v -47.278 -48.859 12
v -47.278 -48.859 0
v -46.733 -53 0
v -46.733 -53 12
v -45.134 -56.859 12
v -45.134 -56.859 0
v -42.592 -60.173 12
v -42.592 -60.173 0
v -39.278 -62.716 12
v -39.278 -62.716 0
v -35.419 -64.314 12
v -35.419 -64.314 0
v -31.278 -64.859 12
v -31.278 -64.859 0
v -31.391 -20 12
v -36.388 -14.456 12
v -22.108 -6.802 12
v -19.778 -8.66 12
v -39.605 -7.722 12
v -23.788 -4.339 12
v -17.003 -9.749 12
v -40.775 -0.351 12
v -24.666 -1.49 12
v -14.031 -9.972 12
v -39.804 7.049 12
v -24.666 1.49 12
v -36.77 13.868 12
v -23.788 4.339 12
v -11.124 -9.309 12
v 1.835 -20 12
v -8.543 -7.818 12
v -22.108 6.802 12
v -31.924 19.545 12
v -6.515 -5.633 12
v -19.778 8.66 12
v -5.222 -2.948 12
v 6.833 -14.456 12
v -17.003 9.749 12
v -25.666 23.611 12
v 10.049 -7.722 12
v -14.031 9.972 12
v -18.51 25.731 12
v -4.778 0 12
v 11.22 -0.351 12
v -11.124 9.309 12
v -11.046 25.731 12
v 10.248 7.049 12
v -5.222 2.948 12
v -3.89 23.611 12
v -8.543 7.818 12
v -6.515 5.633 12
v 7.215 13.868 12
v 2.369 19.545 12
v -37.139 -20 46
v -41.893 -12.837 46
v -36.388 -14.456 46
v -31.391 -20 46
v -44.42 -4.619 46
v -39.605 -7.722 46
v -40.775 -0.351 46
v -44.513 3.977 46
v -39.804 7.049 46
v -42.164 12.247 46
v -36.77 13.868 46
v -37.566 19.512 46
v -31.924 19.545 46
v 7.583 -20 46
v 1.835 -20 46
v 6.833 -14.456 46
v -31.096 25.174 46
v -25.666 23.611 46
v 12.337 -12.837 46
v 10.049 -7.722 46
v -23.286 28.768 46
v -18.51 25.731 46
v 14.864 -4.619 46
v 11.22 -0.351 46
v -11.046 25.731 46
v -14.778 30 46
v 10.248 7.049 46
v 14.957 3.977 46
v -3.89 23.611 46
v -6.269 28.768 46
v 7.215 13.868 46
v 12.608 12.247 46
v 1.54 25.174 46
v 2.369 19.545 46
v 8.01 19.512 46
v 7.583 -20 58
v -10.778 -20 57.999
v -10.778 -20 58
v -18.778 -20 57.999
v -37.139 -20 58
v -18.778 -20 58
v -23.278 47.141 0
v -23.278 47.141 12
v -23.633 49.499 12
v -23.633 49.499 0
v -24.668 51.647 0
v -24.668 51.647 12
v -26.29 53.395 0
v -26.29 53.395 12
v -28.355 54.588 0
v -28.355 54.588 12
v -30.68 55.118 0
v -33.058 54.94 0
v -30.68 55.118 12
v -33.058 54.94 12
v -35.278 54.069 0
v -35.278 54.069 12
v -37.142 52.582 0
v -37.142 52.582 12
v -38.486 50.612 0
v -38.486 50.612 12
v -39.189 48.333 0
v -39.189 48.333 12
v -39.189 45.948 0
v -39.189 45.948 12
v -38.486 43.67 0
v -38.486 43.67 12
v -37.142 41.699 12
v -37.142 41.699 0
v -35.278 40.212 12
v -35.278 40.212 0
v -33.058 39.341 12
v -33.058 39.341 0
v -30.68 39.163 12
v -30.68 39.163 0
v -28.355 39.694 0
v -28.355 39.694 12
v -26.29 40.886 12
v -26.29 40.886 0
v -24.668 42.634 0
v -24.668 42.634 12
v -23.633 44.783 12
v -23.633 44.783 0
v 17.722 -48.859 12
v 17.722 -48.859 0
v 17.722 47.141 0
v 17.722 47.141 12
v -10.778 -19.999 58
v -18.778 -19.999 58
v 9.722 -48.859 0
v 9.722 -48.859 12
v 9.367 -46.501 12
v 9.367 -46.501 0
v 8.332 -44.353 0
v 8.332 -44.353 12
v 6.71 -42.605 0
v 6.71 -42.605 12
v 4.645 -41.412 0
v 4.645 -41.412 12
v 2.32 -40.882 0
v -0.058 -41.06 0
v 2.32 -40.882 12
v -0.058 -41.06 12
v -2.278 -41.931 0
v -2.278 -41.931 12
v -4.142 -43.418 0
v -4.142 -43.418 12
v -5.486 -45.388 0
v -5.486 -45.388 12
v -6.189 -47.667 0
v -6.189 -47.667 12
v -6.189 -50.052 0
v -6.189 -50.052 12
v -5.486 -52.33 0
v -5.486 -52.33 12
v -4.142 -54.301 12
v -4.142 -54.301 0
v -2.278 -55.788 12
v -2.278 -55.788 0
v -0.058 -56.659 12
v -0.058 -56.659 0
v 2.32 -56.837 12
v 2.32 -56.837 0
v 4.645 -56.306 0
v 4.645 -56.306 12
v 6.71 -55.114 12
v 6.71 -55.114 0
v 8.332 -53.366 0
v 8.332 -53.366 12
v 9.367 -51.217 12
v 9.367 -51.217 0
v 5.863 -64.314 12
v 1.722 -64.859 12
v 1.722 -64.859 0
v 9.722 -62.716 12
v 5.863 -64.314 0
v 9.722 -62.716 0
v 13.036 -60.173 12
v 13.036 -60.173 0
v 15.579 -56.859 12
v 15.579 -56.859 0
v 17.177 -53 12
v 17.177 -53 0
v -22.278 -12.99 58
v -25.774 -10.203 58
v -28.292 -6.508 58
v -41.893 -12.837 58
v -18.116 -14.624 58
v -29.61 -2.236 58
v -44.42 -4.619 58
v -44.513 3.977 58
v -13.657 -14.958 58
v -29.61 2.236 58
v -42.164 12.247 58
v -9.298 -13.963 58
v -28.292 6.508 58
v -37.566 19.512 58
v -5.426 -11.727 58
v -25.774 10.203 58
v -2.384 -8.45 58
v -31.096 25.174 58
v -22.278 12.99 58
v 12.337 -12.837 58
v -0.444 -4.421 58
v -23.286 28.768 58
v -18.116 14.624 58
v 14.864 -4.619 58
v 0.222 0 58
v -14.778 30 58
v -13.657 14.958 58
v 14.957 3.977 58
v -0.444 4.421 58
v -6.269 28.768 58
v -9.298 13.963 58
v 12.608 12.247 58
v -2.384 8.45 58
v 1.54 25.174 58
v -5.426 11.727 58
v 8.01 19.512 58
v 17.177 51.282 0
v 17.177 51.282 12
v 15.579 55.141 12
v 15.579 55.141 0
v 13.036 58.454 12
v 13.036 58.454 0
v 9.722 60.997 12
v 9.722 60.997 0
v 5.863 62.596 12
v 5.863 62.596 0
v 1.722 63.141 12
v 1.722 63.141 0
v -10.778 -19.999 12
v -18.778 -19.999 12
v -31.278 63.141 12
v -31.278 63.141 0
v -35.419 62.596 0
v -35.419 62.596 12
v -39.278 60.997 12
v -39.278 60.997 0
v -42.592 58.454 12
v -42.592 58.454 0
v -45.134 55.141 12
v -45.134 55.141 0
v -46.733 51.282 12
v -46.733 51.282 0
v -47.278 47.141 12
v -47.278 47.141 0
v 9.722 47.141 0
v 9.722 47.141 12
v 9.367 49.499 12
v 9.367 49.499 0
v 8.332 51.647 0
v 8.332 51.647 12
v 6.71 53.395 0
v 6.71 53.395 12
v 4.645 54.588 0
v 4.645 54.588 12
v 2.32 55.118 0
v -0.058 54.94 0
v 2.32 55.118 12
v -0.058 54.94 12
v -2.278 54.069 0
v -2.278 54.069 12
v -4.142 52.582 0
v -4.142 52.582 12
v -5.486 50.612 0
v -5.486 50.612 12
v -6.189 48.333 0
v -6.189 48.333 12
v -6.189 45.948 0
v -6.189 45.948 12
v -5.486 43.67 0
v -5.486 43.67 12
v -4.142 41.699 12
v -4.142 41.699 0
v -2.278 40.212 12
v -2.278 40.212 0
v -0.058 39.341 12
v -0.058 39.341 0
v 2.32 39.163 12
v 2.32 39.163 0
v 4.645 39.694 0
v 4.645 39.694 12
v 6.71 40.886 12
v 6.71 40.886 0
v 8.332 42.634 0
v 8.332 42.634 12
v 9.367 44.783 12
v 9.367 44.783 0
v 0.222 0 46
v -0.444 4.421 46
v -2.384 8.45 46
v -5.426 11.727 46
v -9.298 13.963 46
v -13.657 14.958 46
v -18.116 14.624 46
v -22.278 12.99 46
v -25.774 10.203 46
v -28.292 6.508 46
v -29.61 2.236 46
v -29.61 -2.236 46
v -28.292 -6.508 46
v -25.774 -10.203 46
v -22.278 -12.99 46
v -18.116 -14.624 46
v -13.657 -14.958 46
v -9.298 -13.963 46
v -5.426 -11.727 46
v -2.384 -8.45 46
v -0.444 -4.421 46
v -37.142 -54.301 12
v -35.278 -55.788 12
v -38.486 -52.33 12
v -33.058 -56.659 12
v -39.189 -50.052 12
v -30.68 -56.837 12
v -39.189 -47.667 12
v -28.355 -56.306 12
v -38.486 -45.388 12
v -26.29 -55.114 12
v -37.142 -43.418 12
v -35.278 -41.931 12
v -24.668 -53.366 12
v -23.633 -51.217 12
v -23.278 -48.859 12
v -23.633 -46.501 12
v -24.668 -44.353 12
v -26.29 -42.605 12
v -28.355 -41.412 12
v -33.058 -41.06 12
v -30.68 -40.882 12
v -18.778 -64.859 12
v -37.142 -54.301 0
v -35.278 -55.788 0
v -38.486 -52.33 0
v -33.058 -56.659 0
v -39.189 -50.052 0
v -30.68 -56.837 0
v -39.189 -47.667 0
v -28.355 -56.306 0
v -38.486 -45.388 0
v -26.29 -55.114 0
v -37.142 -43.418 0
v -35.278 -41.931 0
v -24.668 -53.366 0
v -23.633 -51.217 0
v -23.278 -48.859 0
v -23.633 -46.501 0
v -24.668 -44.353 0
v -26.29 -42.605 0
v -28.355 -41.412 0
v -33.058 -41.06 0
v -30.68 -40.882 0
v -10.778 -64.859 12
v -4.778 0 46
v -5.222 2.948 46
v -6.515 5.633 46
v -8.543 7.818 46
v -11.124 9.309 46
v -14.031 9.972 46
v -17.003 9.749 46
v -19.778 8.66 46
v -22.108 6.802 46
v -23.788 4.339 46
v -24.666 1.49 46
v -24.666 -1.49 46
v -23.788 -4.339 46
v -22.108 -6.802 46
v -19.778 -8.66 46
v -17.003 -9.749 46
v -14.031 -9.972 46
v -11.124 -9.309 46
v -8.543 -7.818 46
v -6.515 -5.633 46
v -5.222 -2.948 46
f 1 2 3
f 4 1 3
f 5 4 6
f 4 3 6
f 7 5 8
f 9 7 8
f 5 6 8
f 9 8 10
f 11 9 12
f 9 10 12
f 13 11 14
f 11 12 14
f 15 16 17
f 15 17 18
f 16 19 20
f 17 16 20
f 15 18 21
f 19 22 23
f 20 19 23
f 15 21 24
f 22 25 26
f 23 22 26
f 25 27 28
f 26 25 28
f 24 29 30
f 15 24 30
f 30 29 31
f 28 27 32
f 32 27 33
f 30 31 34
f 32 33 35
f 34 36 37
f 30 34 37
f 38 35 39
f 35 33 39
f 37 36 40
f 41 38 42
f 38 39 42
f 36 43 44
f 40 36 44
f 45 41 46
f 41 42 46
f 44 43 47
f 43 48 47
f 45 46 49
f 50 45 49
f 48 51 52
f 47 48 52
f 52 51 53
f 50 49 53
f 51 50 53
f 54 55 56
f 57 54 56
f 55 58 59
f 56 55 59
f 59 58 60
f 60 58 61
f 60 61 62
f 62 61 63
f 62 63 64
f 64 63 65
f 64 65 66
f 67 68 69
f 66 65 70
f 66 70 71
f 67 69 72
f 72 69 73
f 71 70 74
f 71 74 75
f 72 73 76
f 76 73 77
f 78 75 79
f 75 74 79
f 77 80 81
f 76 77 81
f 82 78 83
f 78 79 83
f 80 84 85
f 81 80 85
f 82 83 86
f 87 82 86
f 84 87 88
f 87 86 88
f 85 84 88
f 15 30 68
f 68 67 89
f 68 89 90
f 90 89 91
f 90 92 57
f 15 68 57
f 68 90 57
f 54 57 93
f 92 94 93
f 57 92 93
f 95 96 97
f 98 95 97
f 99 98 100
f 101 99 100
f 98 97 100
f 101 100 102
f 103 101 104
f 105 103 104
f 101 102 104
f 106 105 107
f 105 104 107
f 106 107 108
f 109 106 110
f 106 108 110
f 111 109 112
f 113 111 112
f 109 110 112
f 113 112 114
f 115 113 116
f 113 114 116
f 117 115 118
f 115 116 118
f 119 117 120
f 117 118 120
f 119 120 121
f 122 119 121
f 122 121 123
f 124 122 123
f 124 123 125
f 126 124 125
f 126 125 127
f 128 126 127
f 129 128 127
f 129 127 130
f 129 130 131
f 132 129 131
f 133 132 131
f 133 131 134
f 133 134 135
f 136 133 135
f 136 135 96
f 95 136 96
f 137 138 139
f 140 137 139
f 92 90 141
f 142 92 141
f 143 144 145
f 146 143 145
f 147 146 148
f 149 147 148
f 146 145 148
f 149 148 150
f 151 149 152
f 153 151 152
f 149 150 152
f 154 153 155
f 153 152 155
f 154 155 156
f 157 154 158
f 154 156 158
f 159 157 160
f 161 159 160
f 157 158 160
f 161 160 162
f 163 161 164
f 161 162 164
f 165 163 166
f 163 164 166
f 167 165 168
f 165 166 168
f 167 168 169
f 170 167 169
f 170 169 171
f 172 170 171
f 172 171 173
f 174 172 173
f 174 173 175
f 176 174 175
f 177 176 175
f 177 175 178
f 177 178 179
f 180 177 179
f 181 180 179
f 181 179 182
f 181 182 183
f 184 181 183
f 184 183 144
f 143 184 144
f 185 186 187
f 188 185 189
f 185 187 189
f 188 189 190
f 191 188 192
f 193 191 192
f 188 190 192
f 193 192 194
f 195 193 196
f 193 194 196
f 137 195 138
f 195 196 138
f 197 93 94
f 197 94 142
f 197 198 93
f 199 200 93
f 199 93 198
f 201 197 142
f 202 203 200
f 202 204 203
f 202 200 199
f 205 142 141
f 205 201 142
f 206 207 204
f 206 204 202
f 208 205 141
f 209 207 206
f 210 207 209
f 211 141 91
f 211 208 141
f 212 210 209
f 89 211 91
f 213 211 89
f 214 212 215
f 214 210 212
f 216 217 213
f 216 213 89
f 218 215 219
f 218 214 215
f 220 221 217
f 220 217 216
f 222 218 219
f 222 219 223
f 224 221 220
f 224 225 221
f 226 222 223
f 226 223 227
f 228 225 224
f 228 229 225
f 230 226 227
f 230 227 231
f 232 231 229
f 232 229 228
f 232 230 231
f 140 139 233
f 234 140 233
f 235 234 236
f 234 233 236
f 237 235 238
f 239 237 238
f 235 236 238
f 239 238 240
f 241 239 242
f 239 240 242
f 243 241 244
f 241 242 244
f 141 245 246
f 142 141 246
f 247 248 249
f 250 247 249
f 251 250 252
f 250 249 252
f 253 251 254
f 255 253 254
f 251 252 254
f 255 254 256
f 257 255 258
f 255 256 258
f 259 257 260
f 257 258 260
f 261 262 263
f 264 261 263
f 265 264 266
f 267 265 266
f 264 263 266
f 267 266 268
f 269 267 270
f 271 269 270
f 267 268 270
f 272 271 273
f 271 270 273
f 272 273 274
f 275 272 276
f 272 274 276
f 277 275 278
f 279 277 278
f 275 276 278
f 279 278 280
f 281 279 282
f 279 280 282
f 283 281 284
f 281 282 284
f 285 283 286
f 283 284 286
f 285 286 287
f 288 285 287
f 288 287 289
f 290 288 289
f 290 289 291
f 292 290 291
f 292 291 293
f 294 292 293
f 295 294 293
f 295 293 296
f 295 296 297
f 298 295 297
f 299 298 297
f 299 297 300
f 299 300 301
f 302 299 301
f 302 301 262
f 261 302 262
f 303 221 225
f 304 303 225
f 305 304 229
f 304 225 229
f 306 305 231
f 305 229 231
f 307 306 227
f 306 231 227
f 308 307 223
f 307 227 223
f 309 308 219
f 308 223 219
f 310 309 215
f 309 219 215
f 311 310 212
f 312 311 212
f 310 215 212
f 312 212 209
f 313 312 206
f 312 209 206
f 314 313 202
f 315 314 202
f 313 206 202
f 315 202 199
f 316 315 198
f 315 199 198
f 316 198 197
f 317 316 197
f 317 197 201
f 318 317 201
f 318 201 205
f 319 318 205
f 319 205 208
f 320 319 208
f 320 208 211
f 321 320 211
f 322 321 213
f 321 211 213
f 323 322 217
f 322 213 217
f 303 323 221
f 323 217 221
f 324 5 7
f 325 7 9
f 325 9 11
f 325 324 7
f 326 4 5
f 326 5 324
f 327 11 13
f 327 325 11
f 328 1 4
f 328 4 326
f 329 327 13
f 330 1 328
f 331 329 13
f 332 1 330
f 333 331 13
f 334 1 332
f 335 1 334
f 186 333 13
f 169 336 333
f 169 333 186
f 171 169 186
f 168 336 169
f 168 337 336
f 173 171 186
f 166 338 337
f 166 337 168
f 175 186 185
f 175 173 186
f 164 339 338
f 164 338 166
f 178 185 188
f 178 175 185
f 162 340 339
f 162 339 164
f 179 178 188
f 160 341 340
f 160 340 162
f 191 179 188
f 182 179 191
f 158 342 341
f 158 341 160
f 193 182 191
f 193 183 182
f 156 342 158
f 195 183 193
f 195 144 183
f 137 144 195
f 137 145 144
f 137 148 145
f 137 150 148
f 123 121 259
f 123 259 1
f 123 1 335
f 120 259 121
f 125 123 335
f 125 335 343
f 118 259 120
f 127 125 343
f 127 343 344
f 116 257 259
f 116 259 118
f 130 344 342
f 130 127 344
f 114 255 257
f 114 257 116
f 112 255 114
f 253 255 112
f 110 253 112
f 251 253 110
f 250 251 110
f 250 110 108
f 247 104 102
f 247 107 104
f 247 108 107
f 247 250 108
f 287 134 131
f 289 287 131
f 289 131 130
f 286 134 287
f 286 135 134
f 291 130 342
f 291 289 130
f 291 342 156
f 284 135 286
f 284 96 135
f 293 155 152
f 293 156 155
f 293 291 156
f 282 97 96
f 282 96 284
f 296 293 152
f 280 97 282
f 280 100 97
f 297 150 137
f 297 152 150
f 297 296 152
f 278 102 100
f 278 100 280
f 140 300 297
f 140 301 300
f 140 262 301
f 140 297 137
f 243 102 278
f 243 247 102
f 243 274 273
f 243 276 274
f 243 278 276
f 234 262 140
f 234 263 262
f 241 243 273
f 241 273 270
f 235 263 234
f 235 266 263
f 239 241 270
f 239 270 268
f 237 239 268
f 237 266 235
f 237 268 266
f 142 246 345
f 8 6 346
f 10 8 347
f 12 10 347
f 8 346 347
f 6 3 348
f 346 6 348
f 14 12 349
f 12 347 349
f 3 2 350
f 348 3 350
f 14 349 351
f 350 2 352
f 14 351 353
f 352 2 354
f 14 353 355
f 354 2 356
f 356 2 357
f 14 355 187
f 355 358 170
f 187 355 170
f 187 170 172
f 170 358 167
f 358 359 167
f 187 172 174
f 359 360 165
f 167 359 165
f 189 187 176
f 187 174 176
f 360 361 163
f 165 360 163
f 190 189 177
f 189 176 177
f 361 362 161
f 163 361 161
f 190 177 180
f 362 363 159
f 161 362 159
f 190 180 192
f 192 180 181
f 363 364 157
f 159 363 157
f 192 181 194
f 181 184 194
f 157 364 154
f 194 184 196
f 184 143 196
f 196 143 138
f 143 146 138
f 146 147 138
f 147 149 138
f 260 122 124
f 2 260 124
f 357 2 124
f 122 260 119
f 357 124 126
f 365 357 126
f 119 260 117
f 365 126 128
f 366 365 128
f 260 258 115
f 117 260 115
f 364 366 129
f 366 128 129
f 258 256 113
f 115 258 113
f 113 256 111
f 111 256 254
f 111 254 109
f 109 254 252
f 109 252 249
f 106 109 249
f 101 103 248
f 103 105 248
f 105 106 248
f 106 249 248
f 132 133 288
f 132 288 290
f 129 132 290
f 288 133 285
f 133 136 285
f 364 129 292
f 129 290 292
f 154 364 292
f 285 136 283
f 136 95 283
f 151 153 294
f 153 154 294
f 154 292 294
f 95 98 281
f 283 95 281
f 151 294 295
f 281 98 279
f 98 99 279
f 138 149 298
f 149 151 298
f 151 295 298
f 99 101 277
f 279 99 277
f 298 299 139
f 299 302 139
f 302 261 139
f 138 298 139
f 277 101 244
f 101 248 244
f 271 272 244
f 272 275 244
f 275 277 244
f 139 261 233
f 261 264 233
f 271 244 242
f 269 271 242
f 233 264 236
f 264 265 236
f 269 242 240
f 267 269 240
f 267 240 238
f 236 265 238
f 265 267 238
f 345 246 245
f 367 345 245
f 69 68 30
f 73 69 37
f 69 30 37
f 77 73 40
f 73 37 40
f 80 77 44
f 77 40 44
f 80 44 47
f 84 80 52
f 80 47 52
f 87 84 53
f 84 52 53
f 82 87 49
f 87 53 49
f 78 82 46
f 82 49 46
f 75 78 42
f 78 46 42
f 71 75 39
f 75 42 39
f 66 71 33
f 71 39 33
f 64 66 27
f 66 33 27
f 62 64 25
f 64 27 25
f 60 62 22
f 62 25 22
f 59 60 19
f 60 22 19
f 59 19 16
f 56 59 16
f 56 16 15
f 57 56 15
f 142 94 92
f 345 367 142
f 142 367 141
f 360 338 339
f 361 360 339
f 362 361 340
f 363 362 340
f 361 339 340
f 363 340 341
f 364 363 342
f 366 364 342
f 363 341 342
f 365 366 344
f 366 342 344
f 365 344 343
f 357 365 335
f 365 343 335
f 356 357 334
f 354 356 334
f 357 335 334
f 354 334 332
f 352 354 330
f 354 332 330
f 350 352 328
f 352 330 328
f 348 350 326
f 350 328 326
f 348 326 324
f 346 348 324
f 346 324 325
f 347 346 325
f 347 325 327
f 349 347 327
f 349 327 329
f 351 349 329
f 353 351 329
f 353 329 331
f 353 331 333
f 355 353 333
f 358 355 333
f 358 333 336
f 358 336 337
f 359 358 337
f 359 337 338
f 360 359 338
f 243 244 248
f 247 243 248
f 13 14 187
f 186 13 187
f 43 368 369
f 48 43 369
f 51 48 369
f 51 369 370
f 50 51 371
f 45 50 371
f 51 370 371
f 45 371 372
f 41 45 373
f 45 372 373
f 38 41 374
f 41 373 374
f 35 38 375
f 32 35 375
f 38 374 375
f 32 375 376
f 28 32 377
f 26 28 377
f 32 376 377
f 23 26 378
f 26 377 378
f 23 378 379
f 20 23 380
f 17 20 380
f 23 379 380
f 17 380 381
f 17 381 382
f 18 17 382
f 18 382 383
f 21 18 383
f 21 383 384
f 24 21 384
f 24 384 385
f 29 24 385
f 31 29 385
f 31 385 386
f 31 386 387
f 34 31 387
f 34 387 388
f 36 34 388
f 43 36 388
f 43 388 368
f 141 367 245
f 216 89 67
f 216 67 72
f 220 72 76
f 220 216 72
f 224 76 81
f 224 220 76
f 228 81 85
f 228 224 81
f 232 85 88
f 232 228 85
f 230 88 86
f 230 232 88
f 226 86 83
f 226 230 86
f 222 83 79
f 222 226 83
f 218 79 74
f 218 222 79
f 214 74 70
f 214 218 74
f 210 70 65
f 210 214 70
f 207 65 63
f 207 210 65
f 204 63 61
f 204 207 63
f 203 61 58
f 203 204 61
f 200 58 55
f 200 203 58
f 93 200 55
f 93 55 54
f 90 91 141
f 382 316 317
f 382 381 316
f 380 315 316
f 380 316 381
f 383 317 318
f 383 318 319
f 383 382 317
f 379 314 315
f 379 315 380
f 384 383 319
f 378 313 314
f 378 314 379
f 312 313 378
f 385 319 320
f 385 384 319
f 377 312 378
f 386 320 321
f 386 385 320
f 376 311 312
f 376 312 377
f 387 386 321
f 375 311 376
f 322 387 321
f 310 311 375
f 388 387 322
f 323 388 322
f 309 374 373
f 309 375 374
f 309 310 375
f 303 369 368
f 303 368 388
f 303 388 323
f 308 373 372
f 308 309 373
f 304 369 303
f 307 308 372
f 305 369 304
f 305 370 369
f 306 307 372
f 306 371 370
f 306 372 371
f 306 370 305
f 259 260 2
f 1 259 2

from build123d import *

# Parameters (mm, degrees)
F1_DEPTH  = 12
F2_R      = 8
F3_DEPTH  = 25
F4_R      = 26
F5_DEPTH  = 46
F6_R      = 10
F7_DEPTH  = 58
F8_R      = 30
F9_DEPTH  = 12
F10_R     = 15
F11_DEPTH = 12
F13_DEPTH = 46
F15_DEPTH = 46
F17_DEPTH = 8


with BuildPart() as f1:
    # F0 (on Top) → F1 (new body)
    with BuildSketch(Plane.XY):
        with BuildLine():
            ThreePointArc((-31.2778624006, 63.140702188), (-42.5915708996, 58.454410687), (-47.2778624006, 47.140702188))
            Line((-47.2778624006, 47.140702188), (-47.2778624006, -48.859297812))
            ThreePointArc((-47.2778624006, -48.859297812), (-42.5915708996, -60.173006311), (-31.2778624006, -64.859297812))
            Line((-31.2778624006, -64.859297812), (1.7221375994, -64.859297812))
            ThreePointArc((1.7221375994, -64.859297812), (13.0358460984, -60.173006311), (17.7221375994, -48.859297812))
            Line((17.7221375994, -48.859297812), (17.7221375994, 47.140702188))
            ThreePointArc((17.7221375994, 47.140702188), (13.0358460984, 58.454410687), (1.7221375994, 63.140702188))
            Line((1.7221375994, 63.140702188), (-31.2778624006, 63.140702188))
        make_face()
    extrude(amount=F1_DEPTH)

    # F2 (on face) → F3 (cut)
    with BuildSketch(Plane.XY.offset(12)):
        with Locations((-31.2778624006, 47.140702188)):
            Circle(F2_R)
        with Locations((1.7221375994, 47.140702188)):
            Circle(F2_R)
        with Locations((1.7221375994, -48.859297812)):
            Circle(F2_R)
        with Locations((-31.2778624006, -48.859297812)):
            Circle(F2_R)
    extrude(amount=-F3_DEPTH, mode=Mode.SUBTRACT)


with BuildPart() as f5:
    # F4 (on face) → F5 (new body)
    with BuildSketch(Plane.XY.offset(12)):
        with Locations((-14.7778624006, 0)):
            Circle(F4_R)
    extrude(amount=F5_DEPTH)

    # F6 (on face) → F7 (cut)
    with BuildSketch(Plane.XY.offset(58)):
        with Locations((-14.7778624006, 0)):
            Circle(F6_R)
    extrude(amount=-F7_DEPTH, mode=Mode.SUBTRACT)

    # F8 (on face) → F9 (join)
    with BuildSketch(Plane.XY.offset(58)):
        with Locations((-14.7778624006, 0)):
            Circle(F8_R)
    extrude(amount=-F9_DEPTH)

    # F10 (on face) → F11 (cut)
    with BuildSketch(Plane.XY.offset(58)):
        with Locations((-14.7778624006, 0)):
            Circle(F10_R)
    extrude(amount=-F11_DEPTH, mode=Mode.SUBTRACT)

    # F12 (on face) → F13 (cut, through all)
    with BuildSketch(Plane.XY.offset(58)):
        with BuildLine():
            Line((7.5828173744, -20), (-37.1385421756, -20))
            ThreePointArc((-37.1385421756, -20), (-14.7778624006, -30), (7.5828173744, -20))
        make_face()
    extrude(amount=-F13_DEPTH, mode=Mode.SUBTRACT)


with BuildPart() as f15:
    # F14 (on face) → F15 (new body)
    with BuildSketch(Plane.XY.offset(12)):
        Polygon((-18.7778624006, -19.9992656708), (-18.7778624006, -64.859297812), (-10.7778624006, -64.859297812), (-10.7778624006, -19.9992656708), (-14.7778624006, -19.9992656708), align=None)
    extrude(amount=F15_DEPTH)


with BuildPart() as f17_tool:
    # F16 (on face) → F17 (new body)
    with BuildSketch(Plane.YZ.offset(-10.7778624006)):
        Polygon((-64.859297812, 12), (-19.9992656708, 58), (-64.859297812, 58), align=None)
    extrude(amount=-F17_DEPTH)


with BuildPart() as f5_1:
    add(f5.part)

    # F17: cut by f17_tool
    add(f17_tool.part, mode=Mode.SUBTRACT)


with BuildPart() as f15_1:
    add(f15.part)

    # F17: cut by f17_tool
    add(f17_tool.part, mode=Mode.SUBTRACT)


solid = Compound([f1.part, f5_1.part, f15_1.part])
